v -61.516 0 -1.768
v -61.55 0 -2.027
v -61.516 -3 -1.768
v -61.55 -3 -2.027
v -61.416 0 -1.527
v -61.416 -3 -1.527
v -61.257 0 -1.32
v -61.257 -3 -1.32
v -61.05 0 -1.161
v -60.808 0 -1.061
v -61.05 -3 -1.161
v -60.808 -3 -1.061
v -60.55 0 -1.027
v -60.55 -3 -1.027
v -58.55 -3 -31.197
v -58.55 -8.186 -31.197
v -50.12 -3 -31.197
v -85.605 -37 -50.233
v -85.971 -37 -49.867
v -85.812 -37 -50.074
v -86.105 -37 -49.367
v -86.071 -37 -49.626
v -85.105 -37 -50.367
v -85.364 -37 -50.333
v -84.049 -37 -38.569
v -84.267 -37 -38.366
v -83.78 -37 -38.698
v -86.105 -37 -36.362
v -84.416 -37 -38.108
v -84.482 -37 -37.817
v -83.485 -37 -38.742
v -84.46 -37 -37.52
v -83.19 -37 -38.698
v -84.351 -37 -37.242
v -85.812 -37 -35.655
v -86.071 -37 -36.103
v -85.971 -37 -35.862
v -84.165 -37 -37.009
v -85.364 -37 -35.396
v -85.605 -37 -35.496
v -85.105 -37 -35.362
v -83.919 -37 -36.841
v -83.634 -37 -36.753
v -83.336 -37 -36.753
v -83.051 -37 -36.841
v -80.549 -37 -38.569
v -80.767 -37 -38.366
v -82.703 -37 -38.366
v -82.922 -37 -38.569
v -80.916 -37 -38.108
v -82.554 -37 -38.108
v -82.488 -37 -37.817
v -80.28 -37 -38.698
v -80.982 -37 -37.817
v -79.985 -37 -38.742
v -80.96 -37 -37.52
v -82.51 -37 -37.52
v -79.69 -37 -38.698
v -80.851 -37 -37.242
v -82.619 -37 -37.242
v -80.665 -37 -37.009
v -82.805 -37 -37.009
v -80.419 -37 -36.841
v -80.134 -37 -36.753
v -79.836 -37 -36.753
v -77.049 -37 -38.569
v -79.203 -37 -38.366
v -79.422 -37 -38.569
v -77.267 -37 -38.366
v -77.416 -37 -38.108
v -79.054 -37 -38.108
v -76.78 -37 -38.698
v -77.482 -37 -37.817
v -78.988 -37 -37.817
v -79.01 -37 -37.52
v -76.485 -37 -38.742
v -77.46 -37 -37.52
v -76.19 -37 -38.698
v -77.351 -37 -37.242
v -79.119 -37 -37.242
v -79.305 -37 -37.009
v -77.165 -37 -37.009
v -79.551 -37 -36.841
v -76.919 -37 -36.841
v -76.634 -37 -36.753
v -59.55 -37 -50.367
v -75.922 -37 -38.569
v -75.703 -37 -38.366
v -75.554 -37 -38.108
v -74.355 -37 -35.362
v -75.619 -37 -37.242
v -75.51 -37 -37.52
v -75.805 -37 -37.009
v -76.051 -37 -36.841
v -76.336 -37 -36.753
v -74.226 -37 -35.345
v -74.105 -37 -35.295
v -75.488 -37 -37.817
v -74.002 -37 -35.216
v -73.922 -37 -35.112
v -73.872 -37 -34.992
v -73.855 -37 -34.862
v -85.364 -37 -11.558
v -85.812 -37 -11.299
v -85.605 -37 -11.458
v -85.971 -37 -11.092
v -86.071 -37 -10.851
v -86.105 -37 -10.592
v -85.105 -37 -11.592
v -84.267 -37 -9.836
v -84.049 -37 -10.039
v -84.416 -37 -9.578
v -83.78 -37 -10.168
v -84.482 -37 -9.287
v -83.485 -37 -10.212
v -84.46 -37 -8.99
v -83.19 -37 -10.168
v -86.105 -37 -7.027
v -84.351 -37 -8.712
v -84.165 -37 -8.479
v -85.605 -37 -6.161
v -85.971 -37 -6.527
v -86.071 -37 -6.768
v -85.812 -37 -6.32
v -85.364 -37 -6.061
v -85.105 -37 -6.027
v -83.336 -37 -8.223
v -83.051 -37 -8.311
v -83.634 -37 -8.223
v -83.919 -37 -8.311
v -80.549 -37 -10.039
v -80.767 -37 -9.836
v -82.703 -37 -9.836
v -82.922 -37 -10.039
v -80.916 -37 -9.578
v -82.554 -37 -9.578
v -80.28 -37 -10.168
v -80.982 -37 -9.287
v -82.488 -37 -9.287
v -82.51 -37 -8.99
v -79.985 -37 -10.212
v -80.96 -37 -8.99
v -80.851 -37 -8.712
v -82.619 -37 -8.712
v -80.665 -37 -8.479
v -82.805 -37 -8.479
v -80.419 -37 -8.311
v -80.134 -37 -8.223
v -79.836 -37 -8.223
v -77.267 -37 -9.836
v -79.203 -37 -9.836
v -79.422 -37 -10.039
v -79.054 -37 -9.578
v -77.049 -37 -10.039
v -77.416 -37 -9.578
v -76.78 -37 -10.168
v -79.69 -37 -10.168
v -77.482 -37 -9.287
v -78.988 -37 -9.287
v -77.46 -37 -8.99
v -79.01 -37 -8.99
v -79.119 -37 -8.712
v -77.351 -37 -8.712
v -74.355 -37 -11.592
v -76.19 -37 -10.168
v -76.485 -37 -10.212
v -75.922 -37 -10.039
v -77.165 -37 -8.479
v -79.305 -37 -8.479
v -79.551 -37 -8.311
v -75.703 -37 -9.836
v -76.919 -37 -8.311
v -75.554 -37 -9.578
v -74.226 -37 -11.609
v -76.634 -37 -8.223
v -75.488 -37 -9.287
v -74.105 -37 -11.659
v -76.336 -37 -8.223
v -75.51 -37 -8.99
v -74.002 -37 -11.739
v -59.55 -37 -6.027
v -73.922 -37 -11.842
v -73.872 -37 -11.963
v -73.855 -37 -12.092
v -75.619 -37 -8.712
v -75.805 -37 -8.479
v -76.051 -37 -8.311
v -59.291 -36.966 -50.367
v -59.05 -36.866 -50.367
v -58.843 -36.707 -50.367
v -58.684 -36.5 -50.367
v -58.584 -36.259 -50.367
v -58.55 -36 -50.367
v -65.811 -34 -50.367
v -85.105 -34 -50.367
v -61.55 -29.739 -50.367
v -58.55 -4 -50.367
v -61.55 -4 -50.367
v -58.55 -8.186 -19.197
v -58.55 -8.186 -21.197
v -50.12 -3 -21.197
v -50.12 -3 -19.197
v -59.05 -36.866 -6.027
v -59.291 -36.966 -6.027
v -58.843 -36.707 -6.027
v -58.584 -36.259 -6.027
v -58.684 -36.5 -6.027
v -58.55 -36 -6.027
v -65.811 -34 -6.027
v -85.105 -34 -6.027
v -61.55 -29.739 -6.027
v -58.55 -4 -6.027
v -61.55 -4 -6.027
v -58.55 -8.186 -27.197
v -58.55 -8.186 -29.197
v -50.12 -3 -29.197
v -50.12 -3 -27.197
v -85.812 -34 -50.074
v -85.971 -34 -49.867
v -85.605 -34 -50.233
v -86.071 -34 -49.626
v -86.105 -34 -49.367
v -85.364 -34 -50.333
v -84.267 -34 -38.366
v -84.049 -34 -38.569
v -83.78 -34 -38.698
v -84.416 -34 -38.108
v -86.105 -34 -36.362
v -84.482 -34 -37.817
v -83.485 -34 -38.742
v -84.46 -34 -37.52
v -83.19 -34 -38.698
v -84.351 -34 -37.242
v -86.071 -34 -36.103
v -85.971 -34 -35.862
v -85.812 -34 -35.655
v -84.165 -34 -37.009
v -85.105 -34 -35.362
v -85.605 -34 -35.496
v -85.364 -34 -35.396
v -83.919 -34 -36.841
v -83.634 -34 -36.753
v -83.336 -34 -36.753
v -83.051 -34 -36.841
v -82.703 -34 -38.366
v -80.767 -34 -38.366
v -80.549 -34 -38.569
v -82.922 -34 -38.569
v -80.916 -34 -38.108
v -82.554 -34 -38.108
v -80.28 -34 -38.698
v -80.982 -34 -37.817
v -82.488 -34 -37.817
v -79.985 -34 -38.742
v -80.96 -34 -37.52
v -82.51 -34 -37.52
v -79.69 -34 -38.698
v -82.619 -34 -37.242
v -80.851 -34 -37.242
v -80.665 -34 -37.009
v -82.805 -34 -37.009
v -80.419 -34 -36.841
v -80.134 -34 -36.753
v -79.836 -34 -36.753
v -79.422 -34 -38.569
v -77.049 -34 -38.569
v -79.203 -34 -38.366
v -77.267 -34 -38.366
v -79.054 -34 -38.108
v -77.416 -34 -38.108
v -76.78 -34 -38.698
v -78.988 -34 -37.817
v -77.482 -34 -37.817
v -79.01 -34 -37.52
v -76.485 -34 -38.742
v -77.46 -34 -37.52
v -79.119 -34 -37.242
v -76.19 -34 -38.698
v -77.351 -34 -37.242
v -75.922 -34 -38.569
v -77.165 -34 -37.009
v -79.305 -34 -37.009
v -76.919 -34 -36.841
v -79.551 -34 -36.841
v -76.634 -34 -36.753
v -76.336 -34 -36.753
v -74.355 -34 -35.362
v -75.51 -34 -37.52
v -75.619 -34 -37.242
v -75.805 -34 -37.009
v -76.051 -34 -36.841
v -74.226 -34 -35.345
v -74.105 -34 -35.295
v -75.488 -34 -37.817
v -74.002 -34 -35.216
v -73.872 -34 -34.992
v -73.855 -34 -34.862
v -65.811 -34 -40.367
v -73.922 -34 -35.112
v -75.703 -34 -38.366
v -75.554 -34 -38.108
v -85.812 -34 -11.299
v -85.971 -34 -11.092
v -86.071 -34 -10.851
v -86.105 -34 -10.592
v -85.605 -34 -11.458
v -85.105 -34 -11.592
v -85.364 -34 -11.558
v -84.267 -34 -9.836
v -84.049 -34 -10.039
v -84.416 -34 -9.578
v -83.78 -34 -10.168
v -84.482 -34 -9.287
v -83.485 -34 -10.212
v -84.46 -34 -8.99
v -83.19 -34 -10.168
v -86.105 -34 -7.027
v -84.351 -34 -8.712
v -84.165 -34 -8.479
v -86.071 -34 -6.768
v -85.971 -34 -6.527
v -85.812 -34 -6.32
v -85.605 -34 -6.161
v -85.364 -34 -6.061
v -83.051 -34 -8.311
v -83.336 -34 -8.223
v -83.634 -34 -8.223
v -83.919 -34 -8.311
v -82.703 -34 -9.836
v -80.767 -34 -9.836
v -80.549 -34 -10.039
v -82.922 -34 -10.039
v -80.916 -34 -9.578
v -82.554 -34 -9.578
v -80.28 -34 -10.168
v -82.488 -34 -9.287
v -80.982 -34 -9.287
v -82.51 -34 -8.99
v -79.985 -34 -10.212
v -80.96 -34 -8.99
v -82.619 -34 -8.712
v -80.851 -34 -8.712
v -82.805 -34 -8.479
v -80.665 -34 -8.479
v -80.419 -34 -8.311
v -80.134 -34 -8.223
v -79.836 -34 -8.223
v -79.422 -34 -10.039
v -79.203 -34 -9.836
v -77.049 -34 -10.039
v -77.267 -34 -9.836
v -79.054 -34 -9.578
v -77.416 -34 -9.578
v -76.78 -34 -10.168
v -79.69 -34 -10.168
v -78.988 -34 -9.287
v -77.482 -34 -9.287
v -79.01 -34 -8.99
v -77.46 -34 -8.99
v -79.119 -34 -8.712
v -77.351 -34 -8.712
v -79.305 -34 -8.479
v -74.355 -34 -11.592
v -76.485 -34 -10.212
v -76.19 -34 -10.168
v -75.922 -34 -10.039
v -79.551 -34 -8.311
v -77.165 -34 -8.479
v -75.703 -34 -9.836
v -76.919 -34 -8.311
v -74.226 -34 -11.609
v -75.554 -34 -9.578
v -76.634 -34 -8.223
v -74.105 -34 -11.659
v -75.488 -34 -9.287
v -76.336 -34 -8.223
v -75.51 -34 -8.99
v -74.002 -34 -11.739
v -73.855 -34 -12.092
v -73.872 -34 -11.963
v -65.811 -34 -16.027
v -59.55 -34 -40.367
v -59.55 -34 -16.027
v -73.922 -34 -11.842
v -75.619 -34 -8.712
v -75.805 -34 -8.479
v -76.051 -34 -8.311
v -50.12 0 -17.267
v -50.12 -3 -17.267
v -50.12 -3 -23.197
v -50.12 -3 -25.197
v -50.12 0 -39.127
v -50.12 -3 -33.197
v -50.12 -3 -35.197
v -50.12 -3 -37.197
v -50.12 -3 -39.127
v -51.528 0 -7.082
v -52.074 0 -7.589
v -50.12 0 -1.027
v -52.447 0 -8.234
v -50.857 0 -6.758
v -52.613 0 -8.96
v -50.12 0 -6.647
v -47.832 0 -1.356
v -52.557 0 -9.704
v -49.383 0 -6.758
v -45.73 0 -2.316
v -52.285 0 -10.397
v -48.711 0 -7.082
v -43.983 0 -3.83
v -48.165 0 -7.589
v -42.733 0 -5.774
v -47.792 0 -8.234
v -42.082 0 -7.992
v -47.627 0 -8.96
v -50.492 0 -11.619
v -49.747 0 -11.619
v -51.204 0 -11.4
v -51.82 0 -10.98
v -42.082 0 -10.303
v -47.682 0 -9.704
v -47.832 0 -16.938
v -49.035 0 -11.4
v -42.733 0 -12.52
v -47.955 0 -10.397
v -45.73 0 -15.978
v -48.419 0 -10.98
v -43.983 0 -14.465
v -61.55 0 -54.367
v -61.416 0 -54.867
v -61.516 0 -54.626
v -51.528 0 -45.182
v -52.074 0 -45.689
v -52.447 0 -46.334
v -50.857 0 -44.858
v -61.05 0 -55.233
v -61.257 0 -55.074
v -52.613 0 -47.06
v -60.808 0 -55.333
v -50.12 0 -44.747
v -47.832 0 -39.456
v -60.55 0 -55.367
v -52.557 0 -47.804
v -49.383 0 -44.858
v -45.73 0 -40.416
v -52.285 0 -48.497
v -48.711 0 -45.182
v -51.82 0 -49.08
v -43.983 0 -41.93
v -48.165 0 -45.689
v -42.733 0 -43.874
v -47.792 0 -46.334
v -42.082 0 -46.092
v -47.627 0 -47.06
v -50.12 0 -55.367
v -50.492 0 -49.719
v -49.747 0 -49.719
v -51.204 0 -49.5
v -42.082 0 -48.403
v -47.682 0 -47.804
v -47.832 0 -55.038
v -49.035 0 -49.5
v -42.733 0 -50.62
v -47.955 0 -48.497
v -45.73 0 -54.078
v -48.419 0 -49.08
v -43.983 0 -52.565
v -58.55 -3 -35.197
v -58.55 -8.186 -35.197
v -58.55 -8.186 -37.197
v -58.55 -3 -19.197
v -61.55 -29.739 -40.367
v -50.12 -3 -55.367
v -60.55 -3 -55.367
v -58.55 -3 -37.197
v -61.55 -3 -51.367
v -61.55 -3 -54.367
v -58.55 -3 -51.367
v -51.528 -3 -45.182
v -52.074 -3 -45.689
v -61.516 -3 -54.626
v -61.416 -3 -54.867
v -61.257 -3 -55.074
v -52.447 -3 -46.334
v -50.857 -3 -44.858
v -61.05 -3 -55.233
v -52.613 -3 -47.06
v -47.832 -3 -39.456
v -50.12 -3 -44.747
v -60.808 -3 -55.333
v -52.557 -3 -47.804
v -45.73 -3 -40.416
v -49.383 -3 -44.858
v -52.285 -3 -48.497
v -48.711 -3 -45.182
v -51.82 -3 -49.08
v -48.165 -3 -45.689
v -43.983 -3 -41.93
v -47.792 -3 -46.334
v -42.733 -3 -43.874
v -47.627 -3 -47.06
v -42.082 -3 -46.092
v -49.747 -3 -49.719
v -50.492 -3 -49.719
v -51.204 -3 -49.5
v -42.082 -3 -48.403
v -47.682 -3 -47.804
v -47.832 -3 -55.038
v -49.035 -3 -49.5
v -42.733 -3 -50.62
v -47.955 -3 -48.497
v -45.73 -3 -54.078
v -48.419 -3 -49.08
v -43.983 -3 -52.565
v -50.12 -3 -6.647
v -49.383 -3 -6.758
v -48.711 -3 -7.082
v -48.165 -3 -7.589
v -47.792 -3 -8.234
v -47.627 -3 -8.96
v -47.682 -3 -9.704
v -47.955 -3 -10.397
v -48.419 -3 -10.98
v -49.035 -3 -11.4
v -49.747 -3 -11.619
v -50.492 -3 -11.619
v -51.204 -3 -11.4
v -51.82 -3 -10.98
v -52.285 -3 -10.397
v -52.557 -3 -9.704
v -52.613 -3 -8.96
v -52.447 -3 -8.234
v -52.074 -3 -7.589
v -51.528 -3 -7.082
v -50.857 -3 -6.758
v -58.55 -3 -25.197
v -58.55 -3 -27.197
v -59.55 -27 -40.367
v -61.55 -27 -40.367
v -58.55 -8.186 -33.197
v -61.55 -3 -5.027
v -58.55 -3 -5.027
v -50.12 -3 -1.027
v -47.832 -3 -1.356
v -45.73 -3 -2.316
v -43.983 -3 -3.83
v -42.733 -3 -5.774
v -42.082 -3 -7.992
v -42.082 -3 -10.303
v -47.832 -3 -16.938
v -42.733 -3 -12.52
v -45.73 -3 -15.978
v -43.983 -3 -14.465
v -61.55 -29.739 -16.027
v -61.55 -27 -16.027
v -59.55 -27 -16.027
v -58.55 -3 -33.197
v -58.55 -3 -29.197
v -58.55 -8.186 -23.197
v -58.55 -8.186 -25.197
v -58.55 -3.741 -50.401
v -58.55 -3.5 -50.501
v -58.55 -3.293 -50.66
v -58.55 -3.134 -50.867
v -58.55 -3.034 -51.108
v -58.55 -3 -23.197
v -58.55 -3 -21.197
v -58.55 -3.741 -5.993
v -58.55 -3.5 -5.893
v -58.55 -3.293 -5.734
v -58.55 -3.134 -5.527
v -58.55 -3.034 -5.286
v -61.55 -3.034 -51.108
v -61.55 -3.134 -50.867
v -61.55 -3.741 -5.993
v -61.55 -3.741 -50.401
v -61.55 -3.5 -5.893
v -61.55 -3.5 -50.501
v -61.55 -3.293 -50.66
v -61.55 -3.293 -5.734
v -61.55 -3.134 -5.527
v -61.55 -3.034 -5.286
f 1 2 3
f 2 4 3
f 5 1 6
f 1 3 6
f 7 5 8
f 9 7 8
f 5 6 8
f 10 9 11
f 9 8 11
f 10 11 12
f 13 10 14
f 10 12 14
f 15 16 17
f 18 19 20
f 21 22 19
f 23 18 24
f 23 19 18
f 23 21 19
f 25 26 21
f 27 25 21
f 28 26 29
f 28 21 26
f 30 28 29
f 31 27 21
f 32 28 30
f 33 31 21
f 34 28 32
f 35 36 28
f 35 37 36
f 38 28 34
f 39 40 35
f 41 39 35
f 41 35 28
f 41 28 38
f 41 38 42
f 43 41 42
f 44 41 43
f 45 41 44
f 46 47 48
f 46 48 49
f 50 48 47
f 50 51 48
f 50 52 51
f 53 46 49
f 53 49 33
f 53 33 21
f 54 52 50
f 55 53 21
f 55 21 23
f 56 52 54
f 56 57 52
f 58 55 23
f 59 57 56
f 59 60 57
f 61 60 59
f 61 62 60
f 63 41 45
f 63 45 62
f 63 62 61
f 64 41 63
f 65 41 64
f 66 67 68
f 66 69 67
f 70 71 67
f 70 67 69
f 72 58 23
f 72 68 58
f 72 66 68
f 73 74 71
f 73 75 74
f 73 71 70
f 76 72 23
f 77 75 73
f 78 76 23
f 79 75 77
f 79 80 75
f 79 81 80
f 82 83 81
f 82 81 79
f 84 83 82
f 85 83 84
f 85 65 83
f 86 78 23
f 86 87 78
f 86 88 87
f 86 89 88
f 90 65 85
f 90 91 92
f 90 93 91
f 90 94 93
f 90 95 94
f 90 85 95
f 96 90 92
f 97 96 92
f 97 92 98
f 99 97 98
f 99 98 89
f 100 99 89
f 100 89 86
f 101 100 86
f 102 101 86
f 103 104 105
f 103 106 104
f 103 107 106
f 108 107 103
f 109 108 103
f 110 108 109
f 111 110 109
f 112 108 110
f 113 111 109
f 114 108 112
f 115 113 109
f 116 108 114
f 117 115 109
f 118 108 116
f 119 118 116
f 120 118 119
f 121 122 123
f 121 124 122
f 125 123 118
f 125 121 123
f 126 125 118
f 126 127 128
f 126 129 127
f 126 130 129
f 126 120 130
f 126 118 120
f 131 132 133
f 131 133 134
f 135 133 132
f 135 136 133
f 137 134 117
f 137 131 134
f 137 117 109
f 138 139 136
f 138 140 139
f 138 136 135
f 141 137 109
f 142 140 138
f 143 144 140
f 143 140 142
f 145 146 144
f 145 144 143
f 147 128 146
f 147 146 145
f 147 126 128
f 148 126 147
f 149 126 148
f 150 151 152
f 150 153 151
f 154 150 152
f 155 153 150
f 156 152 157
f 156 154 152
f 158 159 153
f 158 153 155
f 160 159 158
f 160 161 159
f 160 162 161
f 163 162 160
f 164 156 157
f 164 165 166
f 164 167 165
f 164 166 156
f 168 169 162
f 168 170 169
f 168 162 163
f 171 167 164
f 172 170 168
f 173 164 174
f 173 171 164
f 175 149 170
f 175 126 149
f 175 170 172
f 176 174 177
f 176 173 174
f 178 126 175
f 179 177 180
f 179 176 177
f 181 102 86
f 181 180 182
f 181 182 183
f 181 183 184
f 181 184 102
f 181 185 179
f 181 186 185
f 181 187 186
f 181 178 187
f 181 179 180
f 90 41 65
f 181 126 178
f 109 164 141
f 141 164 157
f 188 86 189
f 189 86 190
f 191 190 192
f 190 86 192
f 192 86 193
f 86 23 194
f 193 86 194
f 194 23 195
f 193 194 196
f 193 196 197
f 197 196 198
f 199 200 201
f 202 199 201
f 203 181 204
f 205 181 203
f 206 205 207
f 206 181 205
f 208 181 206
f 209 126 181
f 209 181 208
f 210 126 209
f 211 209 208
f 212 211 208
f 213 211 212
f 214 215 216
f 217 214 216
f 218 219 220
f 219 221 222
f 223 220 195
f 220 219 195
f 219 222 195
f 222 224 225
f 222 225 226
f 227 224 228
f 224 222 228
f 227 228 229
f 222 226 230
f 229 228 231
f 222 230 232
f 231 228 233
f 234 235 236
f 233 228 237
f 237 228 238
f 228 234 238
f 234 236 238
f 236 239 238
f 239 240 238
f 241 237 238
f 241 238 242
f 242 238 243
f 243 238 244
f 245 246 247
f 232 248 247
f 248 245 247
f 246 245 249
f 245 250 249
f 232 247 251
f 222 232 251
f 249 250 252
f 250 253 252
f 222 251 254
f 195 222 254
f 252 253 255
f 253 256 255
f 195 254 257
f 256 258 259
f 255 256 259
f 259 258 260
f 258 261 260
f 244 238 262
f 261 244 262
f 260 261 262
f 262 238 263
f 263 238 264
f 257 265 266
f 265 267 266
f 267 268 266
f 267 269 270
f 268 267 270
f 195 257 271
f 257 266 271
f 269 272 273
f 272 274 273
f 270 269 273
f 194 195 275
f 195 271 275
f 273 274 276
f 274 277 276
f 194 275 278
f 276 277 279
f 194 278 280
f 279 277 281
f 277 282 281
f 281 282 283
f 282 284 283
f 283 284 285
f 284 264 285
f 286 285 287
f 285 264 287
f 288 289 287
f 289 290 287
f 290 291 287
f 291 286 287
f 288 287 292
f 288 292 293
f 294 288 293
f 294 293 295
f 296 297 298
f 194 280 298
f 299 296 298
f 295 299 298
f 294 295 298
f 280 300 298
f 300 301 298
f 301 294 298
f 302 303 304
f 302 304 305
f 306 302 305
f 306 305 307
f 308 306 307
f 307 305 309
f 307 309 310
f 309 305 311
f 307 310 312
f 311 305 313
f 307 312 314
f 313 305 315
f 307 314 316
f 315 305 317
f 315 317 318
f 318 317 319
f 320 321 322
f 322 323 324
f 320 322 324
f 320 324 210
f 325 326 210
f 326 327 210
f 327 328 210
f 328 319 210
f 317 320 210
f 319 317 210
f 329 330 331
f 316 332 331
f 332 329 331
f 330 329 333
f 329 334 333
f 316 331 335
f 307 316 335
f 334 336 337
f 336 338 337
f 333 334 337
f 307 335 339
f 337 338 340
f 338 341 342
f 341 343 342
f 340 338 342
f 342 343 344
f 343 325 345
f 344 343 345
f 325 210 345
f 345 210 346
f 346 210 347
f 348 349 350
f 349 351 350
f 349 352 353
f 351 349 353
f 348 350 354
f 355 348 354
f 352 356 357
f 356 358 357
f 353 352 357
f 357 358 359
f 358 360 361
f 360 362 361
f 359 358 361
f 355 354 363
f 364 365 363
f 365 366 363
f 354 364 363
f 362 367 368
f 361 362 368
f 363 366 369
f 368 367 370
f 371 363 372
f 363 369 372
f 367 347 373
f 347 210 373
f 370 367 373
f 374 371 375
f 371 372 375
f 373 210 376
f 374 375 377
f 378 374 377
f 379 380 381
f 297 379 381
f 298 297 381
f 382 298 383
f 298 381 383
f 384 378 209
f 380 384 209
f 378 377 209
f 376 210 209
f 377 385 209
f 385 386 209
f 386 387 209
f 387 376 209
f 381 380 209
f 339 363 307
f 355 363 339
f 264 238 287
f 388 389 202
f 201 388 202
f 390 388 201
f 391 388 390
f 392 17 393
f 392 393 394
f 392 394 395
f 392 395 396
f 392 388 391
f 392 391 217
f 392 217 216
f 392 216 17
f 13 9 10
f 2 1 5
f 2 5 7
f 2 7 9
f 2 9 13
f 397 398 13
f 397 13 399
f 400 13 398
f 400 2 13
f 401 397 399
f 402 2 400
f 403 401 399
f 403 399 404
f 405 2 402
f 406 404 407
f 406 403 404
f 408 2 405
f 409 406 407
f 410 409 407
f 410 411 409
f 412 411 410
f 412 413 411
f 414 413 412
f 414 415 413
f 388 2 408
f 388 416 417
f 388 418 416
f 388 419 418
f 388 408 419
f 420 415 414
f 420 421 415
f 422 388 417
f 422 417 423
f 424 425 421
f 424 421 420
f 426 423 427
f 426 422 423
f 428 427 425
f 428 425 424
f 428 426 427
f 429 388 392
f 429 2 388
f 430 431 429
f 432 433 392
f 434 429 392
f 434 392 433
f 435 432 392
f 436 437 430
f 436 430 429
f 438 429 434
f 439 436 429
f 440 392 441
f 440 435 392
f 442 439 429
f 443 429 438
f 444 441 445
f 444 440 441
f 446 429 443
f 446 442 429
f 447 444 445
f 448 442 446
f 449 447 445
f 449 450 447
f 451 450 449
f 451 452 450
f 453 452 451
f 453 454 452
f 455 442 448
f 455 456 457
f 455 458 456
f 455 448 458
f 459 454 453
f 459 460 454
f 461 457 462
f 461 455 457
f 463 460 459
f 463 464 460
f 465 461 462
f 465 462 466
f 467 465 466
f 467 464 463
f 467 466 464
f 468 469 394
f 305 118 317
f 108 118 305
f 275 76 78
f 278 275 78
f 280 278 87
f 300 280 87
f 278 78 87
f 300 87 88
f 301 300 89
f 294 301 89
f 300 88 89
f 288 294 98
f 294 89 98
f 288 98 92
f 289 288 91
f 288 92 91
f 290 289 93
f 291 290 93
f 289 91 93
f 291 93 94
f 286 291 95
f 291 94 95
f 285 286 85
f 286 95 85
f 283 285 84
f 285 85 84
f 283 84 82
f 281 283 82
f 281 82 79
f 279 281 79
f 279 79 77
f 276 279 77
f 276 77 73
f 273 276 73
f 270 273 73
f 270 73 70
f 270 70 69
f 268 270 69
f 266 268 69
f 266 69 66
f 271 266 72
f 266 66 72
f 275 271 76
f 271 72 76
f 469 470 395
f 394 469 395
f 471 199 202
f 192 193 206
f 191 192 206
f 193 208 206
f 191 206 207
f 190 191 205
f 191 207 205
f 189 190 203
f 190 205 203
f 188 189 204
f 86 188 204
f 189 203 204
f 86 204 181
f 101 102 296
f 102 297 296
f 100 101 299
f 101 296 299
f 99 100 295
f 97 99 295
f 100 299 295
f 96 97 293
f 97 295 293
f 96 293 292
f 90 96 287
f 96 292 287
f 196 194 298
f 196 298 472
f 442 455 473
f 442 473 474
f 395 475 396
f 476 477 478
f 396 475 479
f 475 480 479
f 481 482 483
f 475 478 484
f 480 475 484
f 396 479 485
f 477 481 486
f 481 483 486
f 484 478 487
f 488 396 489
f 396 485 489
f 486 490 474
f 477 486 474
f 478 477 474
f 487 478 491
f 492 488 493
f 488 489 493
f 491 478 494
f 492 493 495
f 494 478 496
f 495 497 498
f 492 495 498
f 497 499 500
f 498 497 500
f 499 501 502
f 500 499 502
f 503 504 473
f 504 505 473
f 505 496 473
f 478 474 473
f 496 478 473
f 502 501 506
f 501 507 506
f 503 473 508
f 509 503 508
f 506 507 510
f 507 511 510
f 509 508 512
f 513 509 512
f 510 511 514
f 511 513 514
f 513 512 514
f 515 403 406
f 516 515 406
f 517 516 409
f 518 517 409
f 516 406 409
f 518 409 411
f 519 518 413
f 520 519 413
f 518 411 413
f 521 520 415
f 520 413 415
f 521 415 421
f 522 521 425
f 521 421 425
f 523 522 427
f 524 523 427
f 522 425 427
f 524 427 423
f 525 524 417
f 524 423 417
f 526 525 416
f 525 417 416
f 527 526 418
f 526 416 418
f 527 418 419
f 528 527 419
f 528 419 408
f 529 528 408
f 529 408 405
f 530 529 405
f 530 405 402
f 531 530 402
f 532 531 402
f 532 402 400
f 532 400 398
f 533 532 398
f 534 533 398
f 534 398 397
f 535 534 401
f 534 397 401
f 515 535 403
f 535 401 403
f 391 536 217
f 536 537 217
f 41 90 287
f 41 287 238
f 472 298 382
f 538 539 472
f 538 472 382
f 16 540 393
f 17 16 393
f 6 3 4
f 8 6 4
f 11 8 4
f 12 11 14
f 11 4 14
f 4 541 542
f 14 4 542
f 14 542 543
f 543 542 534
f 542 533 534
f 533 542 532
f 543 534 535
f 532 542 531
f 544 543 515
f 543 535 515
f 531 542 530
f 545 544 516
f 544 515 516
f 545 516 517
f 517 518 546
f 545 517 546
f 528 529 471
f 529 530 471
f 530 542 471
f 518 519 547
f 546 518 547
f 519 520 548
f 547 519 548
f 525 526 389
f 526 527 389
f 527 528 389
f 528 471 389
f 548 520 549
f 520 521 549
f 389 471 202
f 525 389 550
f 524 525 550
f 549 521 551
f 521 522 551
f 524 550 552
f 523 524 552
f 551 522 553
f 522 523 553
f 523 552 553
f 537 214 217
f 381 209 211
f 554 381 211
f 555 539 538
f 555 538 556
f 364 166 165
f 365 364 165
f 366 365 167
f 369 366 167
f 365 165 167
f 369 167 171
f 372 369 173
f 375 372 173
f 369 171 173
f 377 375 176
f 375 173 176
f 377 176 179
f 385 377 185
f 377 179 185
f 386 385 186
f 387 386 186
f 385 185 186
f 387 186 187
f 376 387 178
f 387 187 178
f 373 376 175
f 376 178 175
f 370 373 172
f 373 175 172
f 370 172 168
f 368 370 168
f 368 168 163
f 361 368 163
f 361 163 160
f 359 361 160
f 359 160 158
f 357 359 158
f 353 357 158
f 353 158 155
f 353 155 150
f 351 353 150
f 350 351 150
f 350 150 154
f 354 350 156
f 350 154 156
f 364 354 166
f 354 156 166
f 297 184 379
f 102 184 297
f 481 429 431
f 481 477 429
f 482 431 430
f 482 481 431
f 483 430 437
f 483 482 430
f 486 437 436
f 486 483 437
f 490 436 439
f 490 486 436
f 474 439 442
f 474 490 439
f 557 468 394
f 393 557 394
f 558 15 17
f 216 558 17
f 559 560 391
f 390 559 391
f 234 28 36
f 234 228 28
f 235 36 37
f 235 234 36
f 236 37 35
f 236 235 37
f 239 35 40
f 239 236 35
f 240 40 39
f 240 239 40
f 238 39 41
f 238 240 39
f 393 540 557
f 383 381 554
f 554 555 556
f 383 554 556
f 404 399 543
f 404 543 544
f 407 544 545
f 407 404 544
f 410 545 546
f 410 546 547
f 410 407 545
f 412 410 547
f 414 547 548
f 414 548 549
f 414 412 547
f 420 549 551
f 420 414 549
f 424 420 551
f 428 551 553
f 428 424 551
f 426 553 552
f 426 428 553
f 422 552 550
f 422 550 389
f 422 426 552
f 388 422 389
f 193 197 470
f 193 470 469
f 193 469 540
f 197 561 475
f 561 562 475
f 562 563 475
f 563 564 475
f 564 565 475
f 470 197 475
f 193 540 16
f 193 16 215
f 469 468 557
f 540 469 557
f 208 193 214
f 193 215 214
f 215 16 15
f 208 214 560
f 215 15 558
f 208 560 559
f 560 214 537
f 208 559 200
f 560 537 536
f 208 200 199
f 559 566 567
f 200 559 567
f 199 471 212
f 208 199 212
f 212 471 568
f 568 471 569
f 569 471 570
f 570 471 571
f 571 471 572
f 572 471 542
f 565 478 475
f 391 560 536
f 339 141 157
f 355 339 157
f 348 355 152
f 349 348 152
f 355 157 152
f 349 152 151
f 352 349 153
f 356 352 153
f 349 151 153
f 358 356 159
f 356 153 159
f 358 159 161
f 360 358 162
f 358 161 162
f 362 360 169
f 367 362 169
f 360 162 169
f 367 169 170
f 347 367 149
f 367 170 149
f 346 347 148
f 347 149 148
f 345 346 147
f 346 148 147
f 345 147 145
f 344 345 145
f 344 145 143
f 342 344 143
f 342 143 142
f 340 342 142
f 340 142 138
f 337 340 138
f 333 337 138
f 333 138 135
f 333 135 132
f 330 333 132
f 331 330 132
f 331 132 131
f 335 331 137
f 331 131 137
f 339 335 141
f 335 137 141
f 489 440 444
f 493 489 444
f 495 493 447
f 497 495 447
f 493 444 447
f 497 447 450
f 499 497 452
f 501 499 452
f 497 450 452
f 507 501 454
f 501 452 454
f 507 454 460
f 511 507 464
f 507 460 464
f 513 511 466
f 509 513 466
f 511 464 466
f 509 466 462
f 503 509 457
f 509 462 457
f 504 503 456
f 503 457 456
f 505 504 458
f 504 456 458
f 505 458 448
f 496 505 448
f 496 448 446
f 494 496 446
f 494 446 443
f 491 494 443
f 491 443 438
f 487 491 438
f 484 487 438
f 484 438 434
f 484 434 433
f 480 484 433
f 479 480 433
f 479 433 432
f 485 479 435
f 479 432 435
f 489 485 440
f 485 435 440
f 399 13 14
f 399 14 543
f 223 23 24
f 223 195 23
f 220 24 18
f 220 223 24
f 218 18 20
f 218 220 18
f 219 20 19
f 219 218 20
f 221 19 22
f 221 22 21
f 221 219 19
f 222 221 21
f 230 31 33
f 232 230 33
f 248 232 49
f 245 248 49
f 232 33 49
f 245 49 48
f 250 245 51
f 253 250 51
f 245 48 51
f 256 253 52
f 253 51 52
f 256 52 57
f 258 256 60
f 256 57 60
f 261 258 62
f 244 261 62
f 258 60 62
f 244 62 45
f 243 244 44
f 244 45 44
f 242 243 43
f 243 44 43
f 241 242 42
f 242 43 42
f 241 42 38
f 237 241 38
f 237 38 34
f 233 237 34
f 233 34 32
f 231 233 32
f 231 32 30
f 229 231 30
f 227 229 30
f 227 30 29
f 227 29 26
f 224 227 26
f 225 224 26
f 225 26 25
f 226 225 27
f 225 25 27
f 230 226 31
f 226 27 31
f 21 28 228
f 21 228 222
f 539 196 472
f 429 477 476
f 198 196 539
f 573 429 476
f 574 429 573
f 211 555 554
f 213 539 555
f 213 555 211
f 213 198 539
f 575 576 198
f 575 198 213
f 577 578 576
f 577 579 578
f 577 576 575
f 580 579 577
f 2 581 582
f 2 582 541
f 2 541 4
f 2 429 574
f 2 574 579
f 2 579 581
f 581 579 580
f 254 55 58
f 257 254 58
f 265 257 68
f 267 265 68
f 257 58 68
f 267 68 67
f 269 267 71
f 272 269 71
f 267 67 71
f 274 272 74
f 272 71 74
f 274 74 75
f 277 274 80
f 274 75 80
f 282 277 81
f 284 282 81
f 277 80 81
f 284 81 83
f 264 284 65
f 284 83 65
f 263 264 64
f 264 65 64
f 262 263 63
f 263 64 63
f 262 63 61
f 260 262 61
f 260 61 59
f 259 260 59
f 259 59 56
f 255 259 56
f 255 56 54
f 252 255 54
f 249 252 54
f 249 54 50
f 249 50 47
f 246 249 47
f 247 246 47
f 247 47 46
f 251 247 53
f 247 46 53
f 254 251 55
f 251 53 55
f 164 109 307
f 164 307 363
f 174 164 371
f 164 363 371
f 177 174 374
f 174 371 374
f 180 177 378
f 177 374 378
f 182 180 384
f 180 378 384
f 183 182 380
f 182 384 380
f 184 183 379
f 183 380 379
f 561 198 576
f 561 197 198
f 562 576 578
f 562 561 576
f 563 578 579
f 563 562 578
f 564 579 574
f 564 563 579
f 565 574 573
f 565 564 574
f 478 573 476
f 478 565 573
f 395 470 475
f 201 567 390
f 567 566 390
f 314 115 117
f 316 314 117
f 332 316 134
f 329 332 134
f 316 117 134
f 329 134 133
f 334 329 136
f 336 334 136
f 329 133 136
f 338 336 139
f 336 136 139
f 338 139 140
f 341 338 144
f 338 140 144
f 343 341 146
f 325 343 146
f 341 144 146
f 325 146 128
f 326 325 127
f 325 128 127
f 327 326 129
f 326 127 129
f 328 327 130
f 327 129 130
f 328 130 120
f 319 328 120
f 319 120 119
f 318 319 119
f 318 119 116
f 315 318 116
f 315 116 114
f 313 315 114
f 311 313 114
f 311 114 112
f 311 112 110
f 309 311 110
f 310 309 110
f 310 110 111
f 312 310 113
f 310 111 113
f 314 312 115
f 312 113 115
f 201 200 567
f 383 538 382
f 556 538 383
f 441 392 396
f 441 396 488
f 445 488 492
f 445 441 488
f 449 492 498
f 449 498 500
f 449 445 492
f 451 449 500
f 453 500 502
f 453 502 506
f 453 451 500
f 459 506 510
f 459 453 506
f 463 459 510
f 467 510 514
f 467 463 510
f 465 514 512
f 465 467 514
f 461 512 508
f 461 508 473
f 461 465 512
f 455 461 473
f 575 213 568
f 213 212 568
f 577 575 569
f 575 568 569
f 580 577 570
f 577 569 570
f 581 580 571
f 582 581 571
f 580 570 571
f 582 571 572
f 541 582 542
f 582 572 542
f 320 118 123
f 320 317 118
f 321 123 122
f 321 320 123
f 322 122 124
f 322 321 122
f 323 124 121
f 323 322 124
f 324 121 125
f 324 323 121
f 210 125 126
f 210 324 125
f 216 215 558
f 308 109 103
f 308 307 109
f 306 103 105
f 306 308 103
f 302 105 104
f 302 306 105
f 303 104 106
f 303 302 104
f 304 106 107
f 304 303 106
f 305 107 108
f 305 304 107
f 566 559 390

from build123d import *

# Parameters (mm, degrees)
SKETCH4_R           = 2.5
BOSS_EXTRUDE1_DEPTH = 3
SKETCH5_W           = 3
SKETCH5_H           = 44.34
BOSS_EXTRUDE2_DEPTH = 34
SKETCH11_R          = 1
BOSS_EXTRUDE3_DEPTH = 3
RIB7_REACH          = 99.577
SKETCH15_WALL_W     = 207.051776086
SKETCH15_WALL_H     = 2
LPATTERN2_COUNT     = 3
LPATTERN2_PITCH     = 4
LPATTERN2_COL_COUNT = 3
LPATTERN2_COL_PITCH = 4
RIB8_REACH          = 107.913
SKETCH16_WALL_W     = 219.851918098
SKETCH16_WALL_H     = 10
FILLET3_R           = 1
SKETCH17_W          = 24.34
SKETCH17_H          = 7
CUT_EXTRUDE1_DEPTH  = 2
FILLET4_R           = 0.5


with BuildPart() as part:
    # Sketch4 → Boss-Extrude1 (new body)
    with BuildSketch(Plane(origin=(0, 0, 0), x_dir=(1, 0, 0), z_dir=(0, 1, 0))):
        with BuildLine():
            Line((-61.549656869, 55.367306066), (-61.549656869, 1.027306066))
            Line((-61.549656869, 1.027306066), (-50.119656869, 1.027306066))
            ThreePointArc((-50.119656869, 1.027306066), (-41.999656869, 9.147306066), (-50.119656869, 17.267306066))
            Line((-50.119656869, 17.267306066), (-50.119656869, 39.127306066))
            ThreePointArc((-50.119656869, 39.127306066), (-41.999656869, 47.247306066), (-50.119656869, 55.367306066))
            Line((-50.119656869, 55.367306066), (-61.549656869, 55.367306066))
        make_face()
        with Locations(Location((-50.119656869, 47.247306066, 0), (0, 0, 270))):
            Circle(SKETCH4_R, mode=Mode.SUBTRACT)
        with Locations(Location((-50.119656869, 9.147306066, 0), (0, 0, 270))):
            Circle(SKETCH4_R, mode=Mode.SUBTRACT)
    extrude(amount=-BOSS_EXTRUDE1_DEPTH)

    # Sketch5 → Boss-Extrude2 (add)
    with BuildSketch(Plane.XZ.offset(3)):
        with Locations((-60.049656869, -28.197306066)):
            Rectangle(SKETCH5_W, SKETCH5_H)
    extrude(amount=BOSS_EXTRUDE2_DEPTH)

    # Sketch11 → Boss-Extrude3 (add)
    with BuildSketch(Plane.XZ.offset(37)):
        Polygon((-86.105180159, -35.362306066), (-86.105180159, -50.367306066), (-61.549656869, -50.367306066), (-61.549656869, -6.027306066), (-86.105180159, -6.027306066), (-86.105180159, -11.592306066), (-73.855180159, -11.592306066), (-73.855180159, -35.362306066), align=None)
        with Locations(Location((-83.485180159, -37.742306066, 0), (0, 0, 270))):
            Circle(SKETCH11_R, mode=Mode.SUBTRACT)
        with Locations(Location((-79.985180159, -37.742306066, 0), (0, 0, 270))):
            Circle(SKETCH11_R, mode=Mode.SUBTRACT)
        with Locations(Location((-76.485180159, -37.742306066, 0), (0, 0, 270))):
            Circle(SKETCH11_R, mode=Mode.SUBTRACT)
        with Locations(Location((-83.485180159, -9.212306066, 0), (0, 0, 270))):
            Circle(SKETCH11_R, mode=Mode.SUBTRACT)
        with Locations(Location((-79.985180159, -9.212306066, 0), (0, 0, 270))):
            Circle(SKETCH11_R, mode=Mode.SUBTRACT)
        with Locations(Location((-76.485180159, -9.212306066, 0), (0, 0, 270))):
            Circle(SKETCH11_R, mode=Mode.SUBTRACT)
    extrude(amount=-BOSS_EXTRUDE3_DEPTH)

    # Sketch15 wall → Rib7 (add, up to next)
    with BuildSketch(Plane(origin=(-54.334656869, -5.592920769, -28.197306066), x_dir=(0.851741772014, 0.523961786591, 0), z_dir=(-0.523961786591, 0.851741772014, 0)), mode=Mode.PRIVATE) as rib7_sk1:
        Rectangle(SKETCH15_WALL_W, SKETCH15_WALL_H)
    rib7_tool1 = extrude(rib7_sk1.sketch, amount=RIB7_REACH, mode=Mode.PRIVATE) - part.part
    rib7 = rib7_tool1.solids().sort_by_distance((-54.334656869, -5.592920769, -28.197306066))[0]
    add(rib7)

    # LPattern2: Rib7 ×3
    with Locations(*[(0, 0, -i * LPATTERN2_PITCH) for i in range(1, LPATTERN2_COUNT)]):
        add(rib7)

    # LPattern2 col: Rib7 ×3
    with Locations(*[(0, 0, i * LPATTERN2_COL_PITCH) for i in range(1, LPATTERN2_COL_COUNT)]):
        add(rib7)

    # Sketch16 wall → Rib8 (add, up to next)
    with BuildSketch(Plane(origin=(-63.680227165, -31.869429704, -6.027306066), x_dir=(0.707106781187, 0.707106781187, 0), z_dir=(-0.707106781187, 0.707106781187, 0)), mode=Mode.PRIVATE) as rib8_sk1:
        with Locations((0, 5)):
            Rectangle(SKETCH16_WALL_W, SKETCH16_WALL_H)
    rib8_tool1 = extrude(rib8_sk1.sketch, amount=-RIB8_REACH, mode=Mode.PRIVATE) - part.part
    rib8 = rib8_tool1.solids().sort_by_distance((-63.680227165, -31.869429704, -6.027306066))[0]
    add(rib8)

    # Mirror1: Rib8 across plane
    add(rib8.mirror(Plane.XY.offset(-28.197306066)))

    # Fillet3
    fillet3_edges = [part.edges().sort_by_distance(p)[0] for p in [
        (-61.549656869, -1.5, -1.027306066),
        (-61.549656869, -1.5, -55.367306066),
        (-60.049656869, -3, -50.367306066),
        (-60.049656869, -3, -6.027306066),
        (-58.549656869, -37, -28.197306066),
        (-86.105180159, -35.5, -11.592306066),
        (-86.105180159, -35.5, -6.027306066),
        (-86.105180159, -35.5, -50.367306066),
        (-86.105180159, -35.5, -35.362306066),
    ]]
    fillet(fillet3_edges, radius=FILLET3_R)

    # Sketch17 → Cut-Extrude1 (cut)
    with BuildSketch(Plane.ZY.offset(61.549656869)):
        with Locations((-28.197306066, -30.5)):
            Rectangle(SKETCH17_W, SKETCH17_H)
    extrude(amount=-CUT_EXTRUDE1_DEPTH, mode=Mode.SUBTRACT)

    # Fillet4
    fillet4_edges = [part.edges().sort_by_distance(p)[0] for p in [
        (-73.855180159, -35.5, -35.362306066),
        (-73.855180159, -35.5, -11.592306066),
    ]]
    fillet(fillet4_edges, radius=FILLET4_R)


solid = part.part
